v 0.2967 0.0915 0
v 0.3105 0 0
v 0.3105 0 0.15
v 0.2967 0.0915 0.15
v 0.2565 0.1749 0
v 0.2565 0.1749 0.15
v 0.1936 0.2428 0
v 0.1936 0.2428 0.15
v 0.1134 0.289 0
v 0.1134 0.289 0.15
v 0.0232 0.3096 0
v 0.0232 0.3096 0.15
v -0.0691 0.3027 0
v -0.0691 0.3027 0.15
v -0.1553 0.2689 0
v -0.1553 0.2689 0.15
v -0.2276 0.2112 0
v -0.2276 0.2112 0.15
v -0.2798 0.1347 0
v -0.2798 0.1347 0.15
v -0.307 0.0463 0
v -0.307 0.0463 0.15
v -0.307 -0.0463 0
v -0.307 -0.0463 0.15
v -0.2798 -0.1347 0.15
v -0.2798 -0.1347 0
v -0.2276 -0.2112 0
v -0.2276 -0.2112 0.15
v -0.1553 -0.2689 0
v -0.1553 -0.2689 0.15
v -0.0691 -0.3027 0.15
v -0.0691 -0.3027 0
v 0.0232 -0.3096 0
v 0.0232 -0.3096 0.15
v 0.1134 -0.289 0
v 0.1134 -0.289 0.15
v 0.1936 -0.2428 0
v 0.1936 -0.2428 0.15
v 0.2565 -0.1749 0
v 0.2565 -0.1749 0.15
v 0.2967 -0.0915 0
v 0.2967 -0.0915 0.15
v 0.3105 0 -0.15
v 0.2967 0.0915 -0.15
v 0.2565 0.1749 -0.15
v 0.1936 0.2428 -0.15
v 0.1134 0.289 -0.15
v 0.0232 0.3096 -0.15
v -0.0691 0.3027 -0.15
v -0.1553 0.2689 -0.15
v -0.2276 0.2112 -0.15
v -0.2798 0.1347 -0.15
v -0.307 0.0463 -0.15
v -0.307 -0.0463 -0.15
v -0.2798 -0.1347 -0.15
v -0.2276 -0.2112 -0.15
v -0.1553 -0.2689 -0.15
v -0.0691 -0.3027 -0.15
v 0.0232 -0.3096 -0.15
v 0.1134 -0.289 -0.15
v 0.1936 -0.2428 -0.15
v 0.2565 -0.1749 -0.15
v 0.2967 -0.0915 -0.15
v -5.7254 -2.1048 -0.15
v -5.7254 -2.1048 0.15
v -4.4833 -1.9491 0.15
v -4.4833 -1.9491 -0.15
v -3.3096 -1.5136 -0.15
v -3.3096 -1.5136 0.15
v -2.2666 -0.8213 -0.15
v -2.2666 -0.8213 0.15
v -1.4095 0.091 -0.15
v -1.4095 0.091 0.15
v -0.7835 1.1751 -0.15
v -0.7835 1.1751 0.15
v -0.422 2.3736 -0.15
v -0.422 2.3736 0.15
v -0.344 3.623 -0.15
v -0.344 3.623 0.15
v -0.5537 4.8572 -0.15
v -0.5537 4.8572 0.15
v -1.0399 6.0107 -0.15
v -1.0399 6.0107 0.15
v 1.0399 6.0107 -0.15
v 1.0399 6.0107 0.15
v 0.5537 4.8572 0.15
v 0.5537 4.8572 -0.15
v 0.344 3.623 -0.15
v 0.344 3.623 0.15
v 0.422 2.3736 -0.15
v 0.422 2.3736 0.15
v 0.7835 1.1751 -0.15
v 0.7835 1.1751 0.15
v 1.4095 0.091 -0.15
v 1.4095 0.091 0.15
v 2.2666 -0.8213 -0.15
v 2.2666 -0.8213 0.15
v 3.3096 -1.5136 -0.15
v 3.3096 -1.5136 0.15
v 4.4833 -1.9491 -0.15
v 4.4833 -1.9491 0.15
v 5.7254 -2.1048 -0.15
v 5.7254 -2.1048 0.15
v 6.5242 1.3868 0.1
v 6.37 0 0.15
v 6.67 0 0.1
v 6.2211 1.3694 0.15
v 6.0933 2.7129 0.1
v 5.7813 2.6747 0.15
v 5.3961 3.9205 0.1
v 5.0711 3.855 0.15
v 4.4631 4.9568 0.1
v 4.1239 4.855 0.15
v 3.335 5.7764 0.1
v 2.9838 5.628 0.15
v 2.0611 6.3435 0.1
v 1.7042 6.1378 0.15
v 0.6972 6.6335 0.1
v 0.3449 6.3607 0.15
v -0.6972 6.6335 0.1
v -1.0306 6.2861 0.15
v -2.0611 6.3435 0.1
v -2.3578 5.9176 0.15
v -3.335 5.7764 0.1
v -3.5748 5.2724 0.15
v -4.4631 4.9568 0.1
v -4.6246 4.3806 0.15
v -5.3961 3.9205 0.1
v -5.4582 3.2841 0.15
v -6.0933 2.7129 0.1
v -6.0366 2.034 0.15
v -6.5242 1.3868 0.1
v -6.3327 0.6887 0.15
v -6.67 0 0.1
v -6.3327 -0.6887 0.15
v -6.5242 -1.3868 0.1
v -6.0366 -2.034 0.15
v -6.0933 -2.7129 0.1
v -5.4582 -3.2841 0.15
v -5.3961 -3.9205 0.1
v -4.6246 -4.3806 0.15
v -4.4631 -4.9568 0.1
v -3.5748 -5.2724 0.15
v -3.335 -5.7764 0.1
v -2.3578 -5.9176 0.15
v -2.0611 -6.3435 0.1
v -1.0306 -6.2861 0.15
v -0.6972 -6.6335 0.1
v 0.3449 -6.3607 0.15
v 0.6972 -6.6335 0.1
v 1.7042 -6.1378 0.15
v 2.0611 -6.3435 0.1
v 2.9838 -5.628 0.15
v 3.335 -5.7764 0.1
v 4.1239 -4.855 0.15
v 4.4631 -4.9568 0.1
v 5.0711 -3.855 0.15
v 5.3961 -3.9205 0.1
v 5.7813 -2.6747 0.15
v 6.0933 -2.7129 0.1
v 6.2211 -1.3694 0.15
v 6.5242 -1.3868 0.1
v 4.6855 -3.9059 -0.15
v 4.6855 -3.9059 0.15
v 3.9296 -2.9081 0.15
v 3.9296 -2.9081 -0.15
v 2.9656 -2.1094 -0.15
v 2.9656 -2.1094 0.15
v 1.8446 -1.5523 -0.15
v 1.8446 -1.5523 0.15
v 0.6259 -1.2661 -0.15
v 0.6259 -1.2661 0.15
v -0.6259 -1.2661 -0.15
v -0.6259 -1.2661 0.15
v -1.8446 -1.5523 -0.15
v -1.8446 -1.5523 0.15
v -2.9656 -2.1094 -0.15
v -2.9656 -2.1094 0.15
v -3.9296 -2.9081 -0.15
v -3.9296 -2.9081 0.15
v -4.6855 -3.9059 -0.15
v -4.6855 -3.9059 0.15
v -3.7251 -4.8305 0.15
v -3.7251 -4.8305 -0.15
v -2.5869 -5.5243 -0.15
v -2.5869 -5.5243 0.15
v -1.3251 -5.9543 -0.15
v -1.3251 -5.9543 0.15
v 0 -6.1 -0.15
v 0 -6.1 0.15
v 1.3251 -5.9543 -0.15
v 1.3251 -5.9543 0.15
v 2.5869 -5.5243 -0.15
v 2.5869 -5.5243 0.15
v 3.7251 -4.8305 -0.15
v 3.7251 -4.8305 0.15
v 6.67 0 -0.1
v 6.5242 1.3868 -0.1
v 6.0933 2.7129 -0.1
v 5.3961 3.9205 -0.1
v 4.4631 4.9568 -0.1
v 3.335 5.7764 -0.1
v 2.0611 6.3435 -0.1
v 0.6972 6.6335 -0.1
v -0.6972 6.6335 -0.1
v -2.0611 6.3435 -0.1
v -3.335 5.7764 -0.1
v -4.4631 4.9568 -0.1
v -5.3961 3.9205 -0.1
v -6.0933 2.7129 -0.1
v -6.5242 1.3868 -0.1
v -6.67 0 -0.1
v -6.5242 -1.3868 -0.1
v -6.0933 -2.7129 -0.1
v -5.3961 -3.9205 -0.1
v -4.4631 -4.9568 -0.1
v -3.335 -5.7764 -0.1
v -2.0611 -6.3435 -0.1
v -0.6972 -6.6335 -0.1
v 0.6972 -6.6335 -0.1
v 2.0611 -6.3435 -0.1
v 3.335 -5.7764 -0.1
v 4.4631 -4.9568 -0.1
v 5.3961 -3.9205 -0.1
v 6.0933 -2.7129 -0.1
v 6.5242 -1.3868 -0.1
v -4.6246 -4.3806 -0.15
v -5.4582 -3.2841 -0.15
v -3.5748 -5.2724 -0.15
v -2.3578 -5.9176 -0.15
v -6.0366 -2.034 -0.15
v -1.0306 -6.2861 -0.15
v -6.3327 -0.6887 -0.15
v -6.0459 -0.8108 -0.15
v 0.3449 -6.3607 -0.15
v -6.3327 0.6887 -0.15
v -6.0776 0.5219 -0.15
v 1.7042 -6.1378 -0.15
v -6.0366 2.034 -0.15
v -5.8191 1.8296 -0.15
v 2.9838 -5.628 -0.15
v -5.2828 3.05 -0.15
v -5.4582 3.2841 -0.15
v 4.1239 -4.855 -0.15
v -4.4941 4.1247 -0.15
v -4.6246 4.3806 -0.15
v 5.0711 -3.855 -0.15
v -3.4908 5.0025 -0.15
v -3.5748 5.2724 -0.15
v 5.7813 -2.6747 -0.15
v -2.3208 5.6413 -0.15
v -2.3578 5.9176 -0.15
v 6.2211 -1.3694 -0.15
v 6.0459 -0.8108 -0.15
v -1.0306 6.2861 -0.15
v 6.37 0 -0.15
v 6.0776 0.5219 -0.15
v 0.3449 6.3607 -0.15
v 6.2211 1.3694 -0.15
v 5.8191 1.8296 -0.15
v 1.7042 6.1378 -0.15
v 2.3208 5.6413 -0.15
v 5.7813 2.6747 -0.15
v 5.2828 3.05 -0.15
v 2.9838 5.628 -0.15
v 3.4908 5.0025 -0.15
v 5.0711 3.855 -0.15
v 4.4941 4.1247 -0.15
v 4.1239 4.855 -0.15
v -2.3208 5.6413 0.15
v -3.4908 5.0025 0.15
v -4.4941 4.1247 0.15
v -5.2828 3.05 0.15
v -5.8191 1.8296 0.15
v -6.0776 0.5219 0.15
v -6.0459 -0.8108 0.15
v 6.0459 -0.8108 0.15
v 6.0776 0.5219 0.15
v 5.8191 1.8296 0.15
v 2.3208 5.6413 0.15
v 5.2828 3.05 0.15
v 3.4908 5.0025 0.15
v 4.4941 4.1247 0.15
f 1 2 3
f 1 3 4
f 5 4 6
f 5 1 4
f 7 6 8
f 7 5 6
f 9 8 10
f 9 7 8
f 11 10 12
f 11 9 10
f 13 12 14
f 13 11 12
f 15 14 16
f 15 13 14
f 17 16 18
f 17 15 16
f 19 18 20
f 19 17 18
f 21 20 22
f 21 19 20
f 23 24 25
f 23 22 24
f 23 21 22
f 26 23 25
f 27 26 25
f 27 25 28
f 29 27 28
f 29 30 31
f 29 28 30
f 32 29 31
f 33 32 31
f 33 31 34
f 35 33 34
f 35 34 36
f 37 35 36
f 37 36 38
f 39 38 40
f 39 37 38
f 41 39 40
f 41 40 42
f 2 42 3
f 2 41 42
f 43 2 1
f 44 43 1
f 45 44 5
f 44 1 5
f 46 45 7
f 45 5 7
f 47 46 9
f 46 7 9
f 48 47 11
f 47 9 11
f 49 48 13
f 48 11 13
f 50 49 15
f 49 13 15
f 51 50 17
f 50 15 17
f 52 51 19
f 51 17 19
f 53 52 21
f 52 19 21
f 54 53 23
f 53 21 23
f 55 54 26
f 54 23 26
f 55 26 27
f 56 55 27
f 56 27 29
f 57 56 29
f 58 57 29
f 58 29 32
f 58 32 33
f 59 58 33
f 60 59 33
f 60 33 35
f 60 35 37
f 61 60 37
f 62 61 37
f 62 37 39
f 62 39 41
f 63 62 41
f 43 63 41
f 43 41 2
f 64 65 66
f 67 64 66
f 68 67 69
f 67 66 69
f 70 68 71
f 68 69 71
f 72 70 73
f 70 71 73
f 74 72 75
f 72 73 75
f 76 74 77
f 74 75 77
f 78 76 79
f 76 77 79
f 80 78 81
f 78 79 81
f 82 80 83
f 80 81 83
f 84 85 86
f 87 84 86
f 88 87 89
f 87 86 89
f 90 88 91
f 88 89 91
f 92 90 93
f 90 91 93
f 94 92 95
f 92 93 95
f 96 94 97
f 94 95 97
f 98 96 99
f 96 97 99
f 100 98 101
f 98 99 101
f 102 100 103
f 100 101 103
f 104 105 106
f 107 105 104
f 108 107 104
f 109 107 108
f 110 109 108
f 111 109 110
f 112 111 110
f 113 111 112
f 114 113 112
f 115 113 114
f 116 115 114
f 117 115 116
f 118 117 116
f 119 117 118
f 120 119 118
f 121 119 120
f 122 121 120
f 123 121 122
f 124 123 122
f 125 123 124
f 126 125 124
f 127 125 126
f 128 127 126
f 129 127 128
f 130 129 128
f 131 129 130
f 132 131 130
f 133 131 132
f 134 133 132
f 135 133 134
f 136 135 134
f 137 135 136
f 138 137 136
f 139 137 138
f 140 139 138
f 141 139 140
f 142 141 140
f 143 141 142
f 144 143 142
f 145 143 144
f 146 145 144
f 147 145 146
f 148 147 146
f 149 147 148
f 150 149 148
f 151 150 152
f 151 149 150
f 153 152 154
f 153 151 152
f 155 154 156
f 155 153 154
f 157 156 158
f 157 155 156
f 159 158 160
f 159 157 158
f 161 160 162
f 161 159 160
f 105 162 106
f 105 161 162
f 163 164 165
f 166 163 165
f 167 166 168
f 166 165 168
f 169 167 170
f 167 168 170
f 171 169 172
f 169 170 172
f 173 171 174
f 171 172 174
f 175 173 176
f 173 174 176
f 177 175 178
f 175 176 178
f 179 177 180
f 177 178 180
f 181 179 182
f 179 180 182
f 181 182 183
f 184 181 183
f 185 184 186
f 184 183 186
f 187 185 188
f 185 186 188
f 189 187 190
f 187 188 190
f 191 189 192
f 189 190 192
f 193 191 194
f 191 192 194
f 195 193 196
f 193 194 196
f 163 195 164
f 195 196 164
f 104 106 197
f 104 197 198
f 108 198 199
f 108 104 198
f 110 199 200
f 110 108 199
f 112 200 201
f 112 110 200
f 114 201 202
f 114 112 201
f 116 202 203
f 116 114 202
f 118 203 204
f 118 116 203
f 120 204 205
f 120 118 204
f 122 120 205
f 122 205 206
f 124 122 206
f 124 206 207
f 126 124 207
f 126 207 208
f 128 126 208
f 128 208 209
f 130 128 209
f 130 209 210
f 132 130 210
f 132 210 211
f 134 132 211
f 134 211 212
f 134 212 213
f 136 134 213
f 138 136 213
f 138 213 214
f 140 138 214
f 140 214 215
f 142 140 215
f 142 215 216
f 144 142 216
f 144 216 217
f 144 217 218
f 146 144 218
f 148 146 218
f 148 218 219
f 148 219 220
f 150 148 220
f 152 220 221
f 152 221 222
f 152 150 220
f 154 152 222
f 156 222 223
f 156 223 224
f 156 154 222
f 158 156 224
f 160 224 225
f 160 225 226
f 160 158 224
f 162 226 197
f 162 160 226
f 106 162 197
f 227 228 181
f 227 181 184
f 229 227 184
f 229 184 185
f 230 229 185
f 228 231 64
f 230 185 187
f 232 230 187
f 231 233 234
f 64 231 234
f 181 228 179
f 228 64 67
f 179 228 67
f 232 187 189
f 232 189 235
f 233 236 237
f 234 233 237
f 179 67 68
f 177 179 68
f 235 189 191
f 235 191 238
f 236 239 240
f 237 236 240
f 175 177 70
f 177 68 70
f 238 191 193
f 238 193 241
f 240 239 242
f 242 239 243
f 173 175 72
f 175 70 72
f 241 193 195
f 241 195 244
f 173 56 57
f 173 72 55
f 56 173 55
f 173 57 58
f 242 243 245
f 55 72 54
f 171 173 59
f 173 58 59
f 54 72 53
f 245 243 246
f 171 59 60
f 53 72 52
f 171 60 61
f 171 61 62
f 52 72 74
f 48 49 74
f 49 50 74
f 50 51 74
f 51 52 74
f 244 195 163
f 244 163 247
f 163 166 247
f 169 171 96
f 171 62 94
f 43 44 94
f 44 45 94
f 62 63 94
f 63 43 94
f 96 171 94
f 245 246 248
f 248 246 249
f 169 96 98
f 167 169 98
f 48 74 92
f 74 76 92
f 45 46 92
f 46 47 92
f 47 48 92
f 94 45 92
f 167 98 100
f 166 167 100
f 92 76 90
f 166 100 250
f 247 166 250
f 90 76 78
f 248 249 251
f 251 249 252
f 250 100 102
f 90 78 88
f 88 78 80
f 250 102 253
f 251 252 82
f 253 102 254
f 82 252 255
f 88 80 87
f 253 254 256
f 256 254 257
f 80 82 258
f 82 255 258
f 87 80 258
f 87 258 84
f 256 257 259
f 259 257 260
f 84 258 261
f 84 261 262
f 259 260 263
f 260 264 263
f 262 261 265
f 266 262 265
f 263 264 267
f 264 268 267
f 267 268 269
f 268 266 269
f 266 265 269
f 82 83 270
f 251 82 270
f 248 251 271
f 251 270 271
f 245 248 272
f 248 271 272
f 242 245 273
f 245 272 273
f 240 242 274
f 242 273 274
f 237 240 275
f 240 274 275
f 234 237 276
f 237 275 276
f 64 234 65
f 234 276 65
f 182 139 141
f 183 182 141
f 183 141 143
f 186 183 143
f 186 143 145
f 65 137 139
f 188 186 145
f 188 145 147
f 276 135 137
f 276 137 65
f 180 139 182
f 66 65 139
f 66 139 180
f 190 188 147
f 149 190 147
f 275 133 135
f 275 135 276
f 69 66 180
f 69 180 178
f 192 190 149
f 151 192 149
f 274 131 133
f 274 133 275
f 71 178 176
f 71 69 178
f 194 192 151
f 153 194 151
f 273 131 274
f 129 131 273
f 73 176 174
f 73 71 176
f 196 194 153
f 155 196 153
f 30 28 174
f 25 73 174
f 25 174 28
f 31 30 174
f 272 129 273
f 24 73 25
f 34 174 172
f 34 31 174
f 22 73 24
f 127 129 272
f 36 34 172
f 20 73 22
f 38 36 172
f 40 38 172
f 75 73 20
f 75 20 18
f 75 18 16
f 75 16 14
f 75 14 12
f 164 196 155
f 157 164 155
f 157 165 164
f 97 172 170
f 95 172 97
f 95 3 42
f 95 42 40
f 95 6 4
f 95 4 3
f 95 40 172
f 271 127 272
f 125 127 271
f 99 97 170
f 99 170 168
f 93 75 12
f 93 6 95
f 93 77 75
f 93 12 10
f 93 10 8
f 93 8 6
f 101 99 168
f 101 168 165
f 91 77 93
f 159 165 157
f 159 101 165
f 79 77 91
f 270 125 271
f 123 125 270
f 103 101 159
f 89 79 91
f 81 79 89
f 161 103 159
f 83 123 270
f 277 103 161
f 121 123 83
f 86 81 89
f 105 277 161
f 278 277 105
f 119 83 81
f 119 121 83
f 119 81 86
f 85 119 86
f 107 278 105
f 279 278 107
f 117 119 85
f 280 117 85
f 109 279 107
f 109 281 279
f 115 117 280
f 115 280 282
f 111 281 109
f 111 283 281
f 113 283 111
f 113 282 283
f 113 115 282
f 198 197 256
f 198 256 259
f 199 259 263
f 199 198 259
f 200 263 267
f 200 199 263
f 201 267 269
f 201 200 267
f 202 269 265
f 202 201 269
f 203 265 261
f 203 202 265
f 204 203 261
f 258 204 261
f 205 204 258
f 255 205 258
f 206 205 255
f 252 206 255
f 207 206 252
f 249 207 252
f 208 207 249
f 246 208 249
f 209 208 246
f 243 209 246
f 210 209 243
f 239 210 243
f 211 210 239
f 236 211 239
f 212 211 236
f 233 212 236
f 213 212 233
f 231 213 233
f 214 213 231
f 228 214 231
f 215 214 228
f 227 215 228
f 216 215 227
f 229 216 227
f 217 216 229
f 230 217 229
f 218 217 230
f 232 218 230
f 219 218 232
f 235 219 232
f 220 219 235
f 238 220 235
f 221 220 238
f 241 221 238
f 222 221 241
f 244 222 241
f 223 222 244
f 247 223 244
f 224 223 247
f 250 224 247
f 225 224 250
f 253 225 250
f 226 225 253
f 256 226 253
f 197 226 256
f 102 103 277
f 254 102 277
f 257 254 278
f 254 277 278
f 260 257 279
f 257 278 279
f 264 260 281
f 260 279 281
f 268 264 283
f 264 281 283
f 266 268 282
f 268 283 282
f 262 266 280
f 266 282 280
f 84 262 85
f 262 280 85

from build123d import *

# Parameters (mm, degrees)
SKETCH1_R               = 6.67
BOSS_EXTRUDE1_DEPTH     = 0.15
CHAMFER1_SIZE           = 0.3
CHAMFER1_SIZE2          = 0.05
CHAMFER2_SIZE           = 0.05
CHAMFER2_SIZE2          = 0.3
SKETCH2_R               = 0.3105
CUT_EXTRUDE1_DEPTH      = 1.15
CUT_EXTRUDE1_DEPTH_BACK = 1.15
CUT_EXTRUDE2_DEPTH      = 1.15
CIRPATTERN1_COUNT       = 3


with BuildPart() as part:
    # Sketch1 → Boss-Extrude1 (new body, symmetric)
    with BuildSketch(Plane.XY):
        Circle(SKETCH1_R)
    extrude(amount=BOSS_EXTRUDE1_DEPTH, both=True)

    # Chamfer1
    chamfer1_edges = [part.edges().sort_by_distance(p)[0] for p in [
        (-6.67, 0, -0.15),
    ]]
    chamfer1_side = [part.faces().sort_by_distance(p)[0] for p in [
        (0, 0, -0.15),
    ]]
    chamfer(chamfer1_edges, length=CHAMFER1_SIZE, length2=CHAMFER1_SIZE2, reference=chamfer1_side[0])

    # Chamfer2
    chamfer2_edges = [part.edges().sort_by_distance(p)[0] for p in [
        (-6.67, 0, 0.15),
    ]]
    chamfer2_side = [part.faces().sort_by_distance(p)[0] for p in [
        (-6.67, 0, 0.025),
    ]]
    chamfer(chamfer2_edges, length=CHAMFER2_SIZE, length2=CHAMFER2_SIZE2, reference=chamfer2_side[0])

    # Sketch2 → Cut-Extrude1 (cut, two sides)
    with BuildSketch(Plane.XY) as cut_extrude1_sk:
        Circle(SKETCH2_R)
    extrude(amount=CUT_EXTRUDE1_DEPTH, mode=Mode.SUBTRACT)
    extrude(cut_extrude1_sk.sketch, amount=-CUT_EXTRUDE1_DEPTH_BACK, mode=Mode.SUBTRACT)

    # Sketch3 → Cut-Extrude2 (cut, symmetric)
    with BuildSketch(Plane.XY):
        with BuildLine():
            ThreePointArc((1.039913882, 6.010705376), (1.065211247, 0.615), (5.725380491, -2.104760848))
            ThreePointArc((5.725380491, -2.104760848), (5.282754963, 3.05), (1.039913882, 6.010705376))
        make_face()
    cut_extrude2 = extrude(amount=CUT_EXTRUDE2_DEPTH, both=True, mode=Mode.SUBTRACT)

    # CirPattern1: Cut-Extrude2 ×3 about axis
    cirpattern1_axis = Axis((0, 0, 0), (0, 0, 1))
    for i in range(1, CIRPATTERN1_COUNT):
        add(cut_extrude2.rotate(cirpattern1_axis, i * 360 / CIRPATTERN1_COUNT), mode=Mode.SUBTRACT)


solid = part.part
